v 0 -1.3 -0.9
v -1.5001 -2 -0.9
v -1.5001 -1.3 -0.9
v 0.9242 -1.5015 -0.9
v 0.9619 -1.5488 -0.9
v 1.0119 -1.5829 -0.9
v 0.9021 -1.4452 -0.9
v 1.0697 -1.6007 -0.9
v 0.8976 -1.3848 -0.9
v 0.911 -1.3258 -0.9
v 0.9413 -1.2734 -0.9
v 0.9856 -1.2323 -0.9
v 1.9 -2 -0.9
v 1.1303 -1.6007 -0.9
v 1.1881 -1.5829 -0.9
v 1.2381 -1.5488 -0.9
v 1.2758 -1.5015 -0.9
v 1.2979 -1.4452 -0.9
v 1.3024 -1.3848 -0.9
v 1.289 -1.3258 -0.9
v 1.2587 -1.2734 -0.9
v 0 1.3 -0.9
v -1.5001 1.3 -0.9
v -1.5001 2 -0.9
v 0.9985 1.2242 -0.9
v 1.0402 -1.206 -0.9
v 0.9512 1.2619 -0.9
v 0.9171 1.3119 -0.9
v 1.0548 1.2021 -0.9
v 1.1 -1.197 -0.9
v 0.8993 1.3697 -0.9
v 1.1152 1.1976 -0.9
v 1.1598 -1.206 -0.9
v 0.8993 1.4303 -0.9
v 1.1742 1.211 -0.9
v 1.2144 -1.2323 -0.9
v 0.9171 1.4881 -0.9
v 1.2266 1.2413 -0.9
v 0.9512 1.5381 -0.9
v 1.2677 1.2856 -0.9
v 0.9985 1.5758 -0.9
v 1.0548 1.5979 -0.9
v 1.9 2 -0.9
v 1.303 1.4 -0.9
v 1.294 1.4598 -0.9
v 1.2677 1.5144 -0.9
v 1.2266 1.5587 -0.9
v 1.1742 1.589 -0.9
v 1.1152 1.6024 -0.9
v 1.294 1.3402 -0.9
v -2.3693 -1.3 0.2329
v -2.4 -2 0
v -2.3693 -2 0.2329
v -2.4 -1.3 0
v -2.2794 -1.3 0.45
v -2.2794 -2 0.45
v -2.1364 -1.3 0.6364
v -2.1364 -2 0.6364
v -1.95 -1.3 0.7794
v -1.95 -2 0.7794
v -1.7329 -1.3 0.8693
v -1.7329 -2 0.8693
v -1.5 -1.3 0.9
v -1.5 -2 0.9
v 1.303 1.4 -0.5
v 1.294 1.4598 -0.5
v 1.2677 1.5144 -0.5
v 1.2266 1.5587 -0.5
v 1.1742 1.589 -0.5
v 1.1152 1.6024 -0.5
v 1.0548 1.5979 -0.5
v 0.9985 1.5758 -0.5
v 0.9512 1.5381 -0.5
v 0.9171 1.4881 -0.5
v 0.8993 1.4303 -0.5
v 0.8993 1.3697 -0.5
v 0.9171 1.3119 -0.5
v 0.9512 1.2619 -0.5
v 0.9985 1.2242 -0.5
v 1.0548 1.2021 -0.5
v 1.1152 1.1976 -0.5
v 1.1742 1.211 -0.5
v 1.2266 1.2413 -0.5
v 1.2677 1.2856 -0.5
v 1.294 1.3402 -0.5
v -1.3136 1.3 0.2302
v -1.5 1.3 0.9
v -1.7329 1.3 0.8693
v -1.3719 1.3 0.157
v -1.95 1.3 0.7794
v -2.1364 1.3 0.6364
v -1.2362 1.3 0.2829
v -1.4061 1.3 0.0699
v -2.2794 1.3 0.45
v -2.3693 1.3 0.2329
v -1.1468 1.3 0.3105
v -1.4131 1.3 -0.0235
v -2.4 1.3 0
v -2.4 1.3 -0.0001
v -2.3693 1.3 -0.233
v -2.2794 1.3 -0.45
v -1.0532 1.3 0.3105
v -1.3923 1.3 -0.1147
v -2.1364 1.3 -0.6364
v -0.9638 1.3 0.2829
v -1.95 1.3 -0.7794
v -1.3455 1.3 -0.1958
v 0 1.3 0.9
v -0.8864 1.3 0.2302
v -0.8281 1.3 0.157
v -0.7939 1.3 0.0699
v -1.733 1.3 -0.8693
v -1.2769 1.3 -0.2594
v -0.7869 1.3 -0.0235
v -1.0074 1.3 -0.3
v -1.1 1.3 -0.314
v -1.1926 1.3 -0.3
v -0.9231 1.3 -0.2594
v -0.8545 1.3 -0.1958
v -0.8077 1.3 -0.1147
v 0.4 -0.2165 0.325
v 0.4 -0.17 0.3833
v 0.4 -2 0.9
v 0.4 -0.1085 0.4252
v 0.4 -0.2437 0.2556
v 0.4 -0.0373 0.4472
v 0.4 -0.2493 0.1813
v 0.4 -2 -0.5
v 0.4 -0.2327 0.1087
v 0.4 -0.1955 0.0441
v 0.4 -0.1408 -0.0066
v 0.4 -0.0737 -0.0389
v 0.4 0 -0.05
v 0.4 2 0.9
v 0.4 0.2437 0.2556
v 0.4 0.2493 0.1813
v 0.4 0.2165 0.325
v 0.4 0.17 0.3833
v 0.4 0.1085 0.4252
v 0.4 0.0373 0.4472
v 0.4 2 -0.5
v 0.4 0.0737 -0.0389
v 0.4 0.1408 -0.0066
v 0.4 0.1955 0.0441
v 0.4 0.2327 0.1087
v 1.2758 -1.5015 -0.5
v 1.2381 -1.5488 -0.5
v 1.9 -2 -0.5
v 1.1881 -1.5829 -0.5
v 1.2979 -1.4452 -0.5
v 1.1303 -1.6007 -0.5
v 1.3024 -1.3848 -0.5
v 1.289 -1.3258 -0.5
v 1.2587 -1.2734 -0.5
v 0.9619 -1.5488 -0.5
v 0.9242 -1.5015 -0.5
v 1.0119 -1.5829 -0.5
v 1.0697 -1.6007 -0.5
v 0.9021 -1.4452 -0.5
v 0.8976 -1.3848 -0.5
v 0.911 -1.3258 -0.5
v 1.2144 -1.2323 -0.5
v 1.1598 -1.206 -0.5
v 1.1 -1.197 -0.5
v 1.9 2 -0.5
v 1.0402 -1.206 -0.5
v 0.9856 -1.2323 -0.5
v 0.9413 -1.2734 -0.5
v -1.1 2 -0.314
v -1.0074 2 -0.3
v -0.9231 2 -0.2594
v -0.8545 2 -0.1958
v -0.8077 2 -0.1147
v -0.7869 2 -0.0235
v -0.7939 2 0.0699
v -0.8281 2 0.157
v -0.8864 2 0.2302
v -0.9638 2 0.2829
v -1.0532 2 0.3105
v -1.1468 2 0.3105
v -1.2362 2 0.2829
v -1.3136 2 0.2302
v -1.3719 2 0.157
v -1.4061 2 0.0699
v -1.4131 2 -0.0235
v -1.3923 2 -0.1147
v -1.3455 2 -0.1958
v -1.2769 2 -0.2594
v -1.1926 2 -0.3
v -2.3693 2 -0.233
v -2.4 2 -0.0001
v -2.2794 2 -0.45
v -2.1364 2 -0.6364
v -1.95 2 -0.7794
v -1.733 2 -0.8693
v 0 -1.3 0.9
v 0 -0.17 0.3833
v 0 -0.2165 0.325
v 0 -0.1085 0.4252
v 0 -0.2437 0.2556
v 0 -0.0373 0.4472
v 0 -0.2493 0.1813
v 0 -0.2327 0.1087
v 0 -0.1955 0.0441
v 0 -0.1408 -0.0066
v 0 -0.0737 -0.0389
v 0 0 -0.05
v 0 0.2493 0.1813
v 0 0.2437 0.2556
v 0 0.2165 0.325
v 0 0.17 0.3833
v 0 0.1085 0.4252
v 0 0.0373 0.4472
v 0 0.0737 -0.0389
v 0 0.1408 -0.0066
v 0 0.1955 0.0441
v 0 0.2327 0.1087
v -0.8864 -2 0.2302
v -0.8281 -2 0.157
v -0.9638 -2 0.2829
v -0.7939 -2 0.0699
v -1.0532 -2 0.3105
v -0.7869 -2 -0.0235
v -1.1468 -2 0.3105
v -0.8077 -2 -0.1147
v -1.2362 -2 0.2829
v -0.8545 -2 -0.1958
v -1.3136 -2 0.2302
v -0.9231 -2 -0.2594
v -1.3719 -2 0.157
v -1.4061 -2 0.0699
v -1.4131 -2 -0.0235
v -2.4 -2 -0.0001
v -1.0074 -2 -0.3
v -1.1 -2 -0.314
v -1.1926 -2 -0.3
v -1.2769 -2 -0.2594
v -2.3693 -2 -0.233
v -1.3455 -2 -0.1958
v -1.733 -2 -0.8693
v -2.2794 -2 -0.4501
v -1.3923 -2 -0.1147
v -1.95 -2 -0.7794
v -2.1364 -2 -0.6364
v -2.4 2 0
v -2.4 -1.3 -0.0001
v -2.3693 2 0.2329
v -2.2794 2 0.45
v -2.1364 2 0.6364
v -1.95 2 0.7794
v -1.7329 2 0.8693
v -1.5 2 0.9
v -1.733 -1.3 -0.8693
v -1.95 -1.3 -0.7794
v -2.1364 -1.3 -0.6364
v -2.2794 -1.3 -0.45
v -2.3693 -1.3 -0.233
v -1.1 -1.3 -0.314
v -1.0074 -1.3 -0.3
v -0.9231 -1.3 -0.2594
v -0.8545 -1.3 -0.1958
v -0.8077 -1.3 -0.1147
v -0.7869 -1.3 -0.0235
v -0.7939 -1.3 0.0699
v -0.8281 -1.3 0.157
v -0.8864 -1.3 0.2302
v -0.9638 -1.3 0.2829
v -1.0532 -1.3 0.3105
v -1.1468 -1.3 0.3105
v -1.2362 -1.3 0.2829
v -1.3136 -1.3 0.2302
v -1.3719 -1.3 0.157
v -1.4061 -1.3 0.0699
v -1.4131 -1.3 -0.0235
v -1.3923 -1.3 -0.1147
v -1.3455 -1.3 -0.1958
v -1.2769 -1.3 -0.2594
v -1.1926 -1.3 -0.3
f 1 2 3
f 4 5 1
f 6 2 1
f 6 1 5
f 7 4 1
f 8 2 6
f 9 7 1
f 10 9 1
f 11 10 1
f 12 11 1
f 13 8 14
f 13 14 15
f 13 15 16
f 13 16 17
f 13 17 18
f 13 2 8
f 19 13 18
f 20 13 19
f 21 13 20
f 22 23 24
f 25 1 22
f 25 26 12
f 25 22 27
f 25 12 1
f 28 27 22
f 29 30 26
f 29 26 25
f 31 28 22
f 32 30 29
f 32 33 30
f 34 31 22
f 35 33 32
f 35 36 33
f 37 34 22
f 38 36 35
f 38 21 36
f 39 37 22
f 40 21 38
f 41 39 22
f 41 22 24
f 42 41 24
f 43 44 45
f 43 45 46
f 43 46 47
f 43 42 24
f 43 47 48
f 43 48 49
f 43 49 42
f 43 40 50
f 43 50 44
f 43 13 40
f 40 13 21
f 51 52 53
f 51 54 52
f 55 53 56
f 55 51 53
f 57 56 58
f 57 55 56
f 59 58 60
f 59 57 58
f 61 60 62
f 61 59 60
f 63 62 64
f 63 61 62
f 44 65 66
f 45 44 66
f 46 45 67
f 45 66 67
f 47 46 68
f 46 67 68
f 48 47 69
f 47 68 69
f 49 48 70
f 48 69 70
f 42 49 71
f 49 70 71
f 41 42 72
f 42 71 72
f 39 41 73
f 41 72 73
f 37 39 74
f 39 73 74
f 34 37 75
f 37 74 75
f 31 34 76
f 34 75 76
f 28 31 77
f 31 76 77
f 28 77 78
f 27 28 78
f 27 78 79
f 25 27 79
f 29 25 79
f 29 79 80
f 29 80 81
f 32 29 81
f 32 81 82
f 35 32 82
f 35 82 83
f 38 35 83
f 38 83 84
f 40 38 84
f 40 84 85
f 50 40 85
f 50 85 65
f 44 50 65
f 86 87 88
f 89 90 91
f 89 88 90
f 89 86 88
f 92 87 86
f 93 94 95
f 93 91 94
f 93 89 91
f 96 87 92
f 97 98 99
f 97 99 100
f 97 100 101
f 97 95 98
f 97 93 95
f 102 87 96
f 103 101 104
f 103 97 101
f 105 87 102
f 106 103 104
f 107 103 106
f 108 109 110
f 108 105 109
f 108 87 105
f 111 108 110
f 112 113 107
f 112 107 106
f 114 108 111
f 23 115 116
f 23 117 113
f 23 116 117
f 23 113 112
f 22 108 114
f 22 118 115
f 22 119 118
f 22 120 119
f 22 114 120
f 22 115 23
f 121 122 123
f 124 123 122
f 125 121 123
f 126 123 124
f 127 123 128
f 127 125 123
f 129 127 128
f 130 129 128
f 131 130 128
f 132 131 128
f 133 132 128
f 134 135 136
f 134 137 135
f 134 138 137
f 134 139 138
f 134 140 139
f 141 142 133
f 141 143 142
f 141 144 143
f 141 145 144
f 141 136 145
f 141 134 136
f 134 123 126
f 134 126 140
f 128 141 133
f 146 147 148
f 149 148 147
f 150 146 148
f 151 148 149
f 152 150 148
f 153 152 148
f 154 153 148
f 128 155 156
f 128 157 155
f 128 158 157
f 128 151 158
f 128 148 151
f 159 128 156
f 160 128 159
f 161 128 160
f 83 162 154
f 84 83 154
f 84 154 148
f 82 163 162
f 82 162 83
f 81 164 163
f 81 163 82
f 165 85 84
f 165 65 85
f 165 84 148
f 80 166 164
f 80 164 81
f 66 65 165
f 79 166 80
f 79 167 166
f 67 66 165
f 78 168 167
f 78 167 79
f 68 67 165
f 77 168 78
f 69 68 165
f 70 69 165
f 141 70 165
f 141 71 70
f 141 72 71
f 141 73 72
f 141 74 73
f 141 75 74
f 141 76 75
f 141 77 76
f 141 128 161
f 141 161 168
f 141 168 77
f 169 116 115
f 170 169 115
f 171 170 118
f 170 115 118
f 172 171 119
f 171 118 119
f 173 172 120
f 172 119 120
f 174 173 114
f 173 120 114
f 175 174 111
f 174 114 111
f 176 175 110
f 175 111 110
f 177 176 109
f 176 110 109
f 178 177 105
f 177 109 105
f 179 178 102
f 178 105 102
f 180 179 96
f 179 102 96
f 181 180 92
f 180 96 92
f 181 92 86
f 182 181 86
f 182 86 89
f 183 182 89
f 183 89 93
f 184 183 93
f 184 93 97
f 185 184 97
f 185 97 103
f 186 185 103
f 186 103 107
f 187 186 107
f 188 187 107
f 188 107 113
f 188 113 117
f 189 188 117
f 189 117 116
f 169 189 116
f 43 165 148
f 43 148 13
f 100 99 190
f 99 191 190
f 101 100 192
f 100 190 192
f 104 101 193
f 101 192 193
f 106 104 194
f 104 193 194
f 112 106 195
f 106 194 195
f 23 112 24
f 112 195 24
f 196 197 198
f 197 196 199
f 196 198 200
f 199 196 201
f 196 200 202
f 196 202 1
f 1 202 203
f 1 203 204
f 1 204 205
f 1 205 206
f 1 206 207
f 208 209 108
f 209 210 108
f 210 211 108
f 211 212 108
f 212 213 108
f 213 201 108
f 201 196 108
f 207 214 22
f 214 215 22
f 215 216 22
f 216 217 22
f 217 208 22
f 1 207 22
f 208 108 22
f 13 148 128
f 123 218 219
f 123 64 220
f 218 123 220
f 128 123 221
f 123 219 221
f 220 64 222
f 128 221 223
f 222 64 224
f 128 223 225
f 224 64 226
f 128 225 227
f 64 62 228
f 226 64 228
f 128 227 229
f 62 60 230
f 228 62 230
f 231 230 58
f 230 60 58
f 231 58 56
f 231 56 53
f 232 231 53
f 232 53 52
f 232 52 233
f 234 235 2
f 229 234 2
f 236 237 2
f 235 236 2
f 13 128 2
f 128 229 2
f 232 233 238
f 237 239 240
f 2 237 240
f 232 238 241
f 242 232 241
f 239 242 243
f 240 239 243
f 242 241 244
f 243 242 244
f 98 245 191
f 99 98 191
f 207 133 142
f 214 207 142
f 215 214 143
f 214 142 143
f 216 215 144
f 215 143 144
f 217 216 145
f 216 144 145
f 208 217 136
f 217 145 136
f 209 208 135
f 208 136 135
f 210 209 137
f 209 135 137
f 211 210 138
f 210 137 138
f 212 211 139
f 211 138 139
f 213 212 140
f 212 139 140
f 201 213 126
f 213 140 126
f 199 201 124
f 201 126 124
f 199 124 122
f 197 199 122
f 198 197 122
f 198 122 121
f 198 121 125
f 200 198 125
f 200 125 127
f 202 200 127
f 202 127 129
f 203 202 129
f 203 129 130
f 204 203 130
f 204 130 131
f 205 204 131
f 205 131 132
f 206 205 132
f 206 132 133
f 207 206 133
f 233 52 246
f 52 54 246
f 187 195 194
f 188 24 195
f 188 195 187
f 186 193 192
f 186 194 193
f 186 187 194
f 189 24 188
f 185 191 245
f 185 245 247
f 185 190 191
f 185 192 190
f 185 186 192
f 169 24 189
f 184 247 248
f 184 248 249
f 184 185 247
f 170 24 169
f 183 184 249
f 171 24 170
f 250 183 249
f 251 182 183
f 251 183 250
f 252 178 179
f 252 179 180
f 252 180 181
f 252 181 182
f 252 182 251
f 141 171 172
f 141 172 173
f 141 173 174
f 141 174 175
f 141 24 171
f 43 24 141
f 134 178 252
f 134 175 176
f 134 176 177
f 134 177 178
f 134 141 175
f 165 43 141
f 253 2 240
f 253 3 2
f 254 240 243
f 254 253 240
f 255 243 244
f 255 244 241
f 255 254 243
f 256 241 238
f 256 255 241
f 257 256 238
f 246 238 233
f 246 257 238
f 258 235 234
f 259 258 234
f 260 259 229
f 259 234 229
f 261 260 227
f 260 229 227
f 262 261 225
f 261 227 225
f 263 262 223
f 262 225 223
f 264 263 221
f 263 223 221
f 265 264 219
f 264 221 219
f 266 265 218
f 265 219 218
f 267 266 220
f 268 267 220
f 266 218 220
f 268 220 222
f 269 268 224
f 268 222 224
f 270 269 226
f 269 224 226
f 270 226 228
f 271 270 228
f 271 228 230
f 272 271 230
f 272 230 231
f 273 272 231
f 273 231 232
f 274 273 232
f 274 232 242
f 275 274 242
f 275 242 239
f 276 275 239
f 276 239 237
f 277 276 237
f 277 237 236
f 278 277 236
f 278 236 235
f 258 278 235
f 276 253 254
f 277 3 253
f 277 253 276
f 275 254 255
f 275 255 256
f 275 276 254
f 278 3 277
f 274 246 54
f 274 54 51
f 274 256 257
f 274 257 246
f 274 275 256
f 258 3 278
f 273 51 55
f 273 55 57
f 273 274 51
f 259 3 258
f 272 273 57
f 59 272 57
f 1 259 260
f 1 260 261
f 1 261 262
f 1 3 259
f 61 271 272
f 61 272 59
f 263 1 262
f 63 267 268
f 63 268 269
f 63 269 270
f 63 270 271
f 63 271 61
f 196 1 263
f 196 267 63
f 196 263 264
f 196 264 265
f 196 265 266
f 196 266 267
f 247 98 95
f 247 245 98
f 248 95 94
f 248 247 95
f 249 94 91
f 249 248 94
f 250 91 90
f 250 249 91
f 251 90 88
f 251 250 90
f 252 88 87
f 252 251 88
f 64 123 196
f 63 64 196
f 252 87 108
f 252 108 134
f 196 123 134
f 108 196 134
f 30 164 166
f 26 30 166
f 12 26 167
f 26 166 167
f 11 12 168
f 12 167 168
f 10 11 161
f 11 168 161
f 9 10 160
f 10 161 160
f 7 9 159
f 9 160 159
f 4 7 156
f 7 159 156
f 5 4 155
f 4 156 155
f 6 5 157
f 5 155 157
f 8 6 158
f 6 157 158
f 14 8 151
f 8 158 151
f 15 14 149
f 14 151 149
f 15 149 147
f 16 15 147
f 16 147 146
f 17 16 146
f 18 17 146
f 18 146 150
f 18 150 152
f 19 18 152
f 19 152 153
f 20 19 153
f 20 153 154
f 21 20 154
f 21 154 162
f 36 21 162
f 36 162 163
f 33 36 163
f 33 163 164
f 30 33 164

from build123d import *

# Parameters (mm, degrees)
CROQUIS1_W              = 1.4
CROQUIS1_H              = 2.6
SALIENTE_EXTRUIR1_DEPTH = 0.4
CROQUIS1_3_W            = 0.4
CROQUIS1_3_H            = 2.6
SALIENTE_EXTRUIR2_DEPTH = 1.9
CROQUIS1_6_W            = 0.4
CROQUIS1_6_H            = 0.7
SALIENTE_EXTRUIR3_DEPTH = 1.9
CROQUIS1_8_W            = 1.4
CROQUIS1_8_H            = 0.7
SALIENTE_EXTRUIR5_DEPTH = 0.4
CROQUIS1_9_W            = 1.4
CROQUIS1_9_H            = 0.7
SALIENTE_EXTRUIR6_DEPTH = 0.4
CROQUIS1_10_W           = 0.4
CROQUIS1_10_H           = 0.7
SALIENTE_EXTRUIR7_DEPTH = 1.9
CROQUIS1_11_W           = 0.4
CROQUIS1_11_H           = 0.7
CROQUIS1_11_W_2         = 1.4
SALIENTE_EXTRUIR8_DEPTH = 2.4
CROQUIS2_R              = 0.203
CORTAR_EXTRUIR1_DEPTH   = 2.4
CROQUIS3_R              = 0.25
CORTAR_EXTRUIR2_DEPTH   = 2.4
CROQUIS4_R              = 0.314
CORTAR_EXTRUIR3_DEPTH   = 10
REDONDEO3_R             = 0.9
REDONDEO4_R             = 0.9


with BuildPart() as part:
    # Croquis1 → Saliente-Extruir1 (new body)
    with BuildSketch(Plane(origin=(0, 0, 0), x_dir=(0, 0, -1), z_dir=(1, 0, 0))):
        with Locations((-0.2, 0)):
            Rectangle(CROQUIS1_W, CROQUIS1_H)
    extrude(amount=SALIENTE_EXTRUIR1_DEPTH)

    # Croquis1<3> → Saliente-Extruir2 (add)
    with BuildSketch(Plane(origin=(0, 0, 0), x_dir=(0, 0, -1), z_dir=(1, 0, 0))):
        with Locations((0.7, 0)):
            Rectangle(CROQUIS1_3_W, CROQUIS1_3_H)
    extrude(amount=SALIENTE_EXTRUIR2_DEPTH)

    # Croquis1<6> → Saliente-Extruir3 (add)
    with BuildSketch(Plane(origin=(0, 0, 0), x_dir=(0, 0, -1), z_dir=(1, 0, 0))):
        with Locations((0.7, 1.65)):
            Rectangle(CROQUIS1_6_W, CROQUIS1_6_H)
    extrude(amount=SALIENTE_EXTRUIR3_DEPTH)

    # Croquis1<8> → Saliente-Extruir5 (add)
    with BuildSketch(Plane(origin=(0, 0, 0), x_dir=(0, 0, -1), z_dir=(1, 0, 0))):
        with Locations((-0.2, 1.65)):
            Rectangle(CROQUIS1_8_W, CROQUIS1_8_H)
    extrude(amount=SALIENTE_EXTRUIR5_DEPTH)

    # Croquis1<9> → Saliente-Extruir6 (add)
    with BuildSketch(Plane(origin=(0, 0, 0), x_dir=(0, 0, -1), z_dir=(1, 0, 0))):
        with Locations((-0.2, -1.65)):
            Rectangle(CROQUIS1_9_W, CROQUIS1_9_H)
    extrude(amount=SALIENTE_EXTRUIR6_DEPTH)

    # Croquis1<10> → Saliente-Extruir7 (add)
    with BuildSketch(Plane(origin=(0, 0, 0), x_dir=(0, 0, -1), z_dir=(1, 0, 0))):
        with Locations((0.7, -1.65)):
            Rectangle(CROQUIS1_10_W, CROQUIS1_10_H)
    extrude(amount=SALIENTE_EXTRUIR7_DEPTH)

    # Croquis1<11> → Saliente-Extruir8 (add)
    with BuildSketch(Plane(origin=(0, 0, 0), x_dir=(0, 0, -1), z_dir=(1, 0, 0))):
        with Locations((0.7, 1.65)):
            Rectangle(CROQUIS1_11_W, CROQUIS1_11_H)
        with Locations((-0.2, 1.65)):
            Rectangle(CROQUIS1_11_W_2, CROQUIS1_11_H)
        with Locations((-0.2, -1.65)):
            Rectangle(CROQUIS1_11_W_2, CROQUIS1_11_H)
        with Locations((0.7, -1.65)):
            Rectangle(CROQUIS1_11_W, CROQUIS1_11_H)
    extrude(amount=-SALIENTE_EXTRUIR8_DEPTH)

    # Croquis2 → Cortar-Extruir1 (cut)
    with BuildSketch(Plane.XY.offset(-0.5)):
        with Locations((1.1, 1.4)):
            Circle(CROQUIS2_R)
        with Locations(Location((1.1, -1.4, 0), (0, 0, 90))):
            Circle(CROQUIS2_R)
    extrude(amount=-CORTAR_EXTRUIR1_DEPTH, mode=Mode.SUBTRACT)

    # Croquis3 → Cortar-Extruir2 (cut)
    with BuildSketch(Plane(origin=(0.4, 0, 0), x_dir=(0, 0, -1), z_dir=(1, 0, 0))):
        with Locations((-0.2, 0)):
            Circle(CROQUIS3_R)
    extrude(amount=-CORTAR_EXTRUIR2_DEPTH, mode=Mode.SUBTRACT)

    # Croquis4 → Cortar-Extruir3 (cut)
    with BuildSketch(Plane.XZ.offset(2)):
        with Locations(Location((-1.1, 0, 0), (0, 0, 270))):
            Circle(CROQUIS4_R)
    extrude(amount=-CORTAR_EXTRUIR3_DEPTH, mode=Mode.SUBTRACT)

    # Redondeo3
    redondeo3_edges = [part.edges().sort_by_distance(p)[0] for p in [
        (-2.4, 1.65, 0.9),
        (-2.4, -1.65, 0.9),
    ]]
    fillet(redondeo3_edges, radius=REDONDEO3_R)

    # Redondeo4
    redondeo4_edges = [part.edges().sort_by_distance(p)[0] for p in [
        (-2.4, -1.65, -0.9),
        (-2.4, 1.65, -0.9),
    ]]
    fillet(redondeo4_edges, radius=REDONDEO4_R - 0.0001)  # a hair under: the kernel refuses the full size


solid = part.part
